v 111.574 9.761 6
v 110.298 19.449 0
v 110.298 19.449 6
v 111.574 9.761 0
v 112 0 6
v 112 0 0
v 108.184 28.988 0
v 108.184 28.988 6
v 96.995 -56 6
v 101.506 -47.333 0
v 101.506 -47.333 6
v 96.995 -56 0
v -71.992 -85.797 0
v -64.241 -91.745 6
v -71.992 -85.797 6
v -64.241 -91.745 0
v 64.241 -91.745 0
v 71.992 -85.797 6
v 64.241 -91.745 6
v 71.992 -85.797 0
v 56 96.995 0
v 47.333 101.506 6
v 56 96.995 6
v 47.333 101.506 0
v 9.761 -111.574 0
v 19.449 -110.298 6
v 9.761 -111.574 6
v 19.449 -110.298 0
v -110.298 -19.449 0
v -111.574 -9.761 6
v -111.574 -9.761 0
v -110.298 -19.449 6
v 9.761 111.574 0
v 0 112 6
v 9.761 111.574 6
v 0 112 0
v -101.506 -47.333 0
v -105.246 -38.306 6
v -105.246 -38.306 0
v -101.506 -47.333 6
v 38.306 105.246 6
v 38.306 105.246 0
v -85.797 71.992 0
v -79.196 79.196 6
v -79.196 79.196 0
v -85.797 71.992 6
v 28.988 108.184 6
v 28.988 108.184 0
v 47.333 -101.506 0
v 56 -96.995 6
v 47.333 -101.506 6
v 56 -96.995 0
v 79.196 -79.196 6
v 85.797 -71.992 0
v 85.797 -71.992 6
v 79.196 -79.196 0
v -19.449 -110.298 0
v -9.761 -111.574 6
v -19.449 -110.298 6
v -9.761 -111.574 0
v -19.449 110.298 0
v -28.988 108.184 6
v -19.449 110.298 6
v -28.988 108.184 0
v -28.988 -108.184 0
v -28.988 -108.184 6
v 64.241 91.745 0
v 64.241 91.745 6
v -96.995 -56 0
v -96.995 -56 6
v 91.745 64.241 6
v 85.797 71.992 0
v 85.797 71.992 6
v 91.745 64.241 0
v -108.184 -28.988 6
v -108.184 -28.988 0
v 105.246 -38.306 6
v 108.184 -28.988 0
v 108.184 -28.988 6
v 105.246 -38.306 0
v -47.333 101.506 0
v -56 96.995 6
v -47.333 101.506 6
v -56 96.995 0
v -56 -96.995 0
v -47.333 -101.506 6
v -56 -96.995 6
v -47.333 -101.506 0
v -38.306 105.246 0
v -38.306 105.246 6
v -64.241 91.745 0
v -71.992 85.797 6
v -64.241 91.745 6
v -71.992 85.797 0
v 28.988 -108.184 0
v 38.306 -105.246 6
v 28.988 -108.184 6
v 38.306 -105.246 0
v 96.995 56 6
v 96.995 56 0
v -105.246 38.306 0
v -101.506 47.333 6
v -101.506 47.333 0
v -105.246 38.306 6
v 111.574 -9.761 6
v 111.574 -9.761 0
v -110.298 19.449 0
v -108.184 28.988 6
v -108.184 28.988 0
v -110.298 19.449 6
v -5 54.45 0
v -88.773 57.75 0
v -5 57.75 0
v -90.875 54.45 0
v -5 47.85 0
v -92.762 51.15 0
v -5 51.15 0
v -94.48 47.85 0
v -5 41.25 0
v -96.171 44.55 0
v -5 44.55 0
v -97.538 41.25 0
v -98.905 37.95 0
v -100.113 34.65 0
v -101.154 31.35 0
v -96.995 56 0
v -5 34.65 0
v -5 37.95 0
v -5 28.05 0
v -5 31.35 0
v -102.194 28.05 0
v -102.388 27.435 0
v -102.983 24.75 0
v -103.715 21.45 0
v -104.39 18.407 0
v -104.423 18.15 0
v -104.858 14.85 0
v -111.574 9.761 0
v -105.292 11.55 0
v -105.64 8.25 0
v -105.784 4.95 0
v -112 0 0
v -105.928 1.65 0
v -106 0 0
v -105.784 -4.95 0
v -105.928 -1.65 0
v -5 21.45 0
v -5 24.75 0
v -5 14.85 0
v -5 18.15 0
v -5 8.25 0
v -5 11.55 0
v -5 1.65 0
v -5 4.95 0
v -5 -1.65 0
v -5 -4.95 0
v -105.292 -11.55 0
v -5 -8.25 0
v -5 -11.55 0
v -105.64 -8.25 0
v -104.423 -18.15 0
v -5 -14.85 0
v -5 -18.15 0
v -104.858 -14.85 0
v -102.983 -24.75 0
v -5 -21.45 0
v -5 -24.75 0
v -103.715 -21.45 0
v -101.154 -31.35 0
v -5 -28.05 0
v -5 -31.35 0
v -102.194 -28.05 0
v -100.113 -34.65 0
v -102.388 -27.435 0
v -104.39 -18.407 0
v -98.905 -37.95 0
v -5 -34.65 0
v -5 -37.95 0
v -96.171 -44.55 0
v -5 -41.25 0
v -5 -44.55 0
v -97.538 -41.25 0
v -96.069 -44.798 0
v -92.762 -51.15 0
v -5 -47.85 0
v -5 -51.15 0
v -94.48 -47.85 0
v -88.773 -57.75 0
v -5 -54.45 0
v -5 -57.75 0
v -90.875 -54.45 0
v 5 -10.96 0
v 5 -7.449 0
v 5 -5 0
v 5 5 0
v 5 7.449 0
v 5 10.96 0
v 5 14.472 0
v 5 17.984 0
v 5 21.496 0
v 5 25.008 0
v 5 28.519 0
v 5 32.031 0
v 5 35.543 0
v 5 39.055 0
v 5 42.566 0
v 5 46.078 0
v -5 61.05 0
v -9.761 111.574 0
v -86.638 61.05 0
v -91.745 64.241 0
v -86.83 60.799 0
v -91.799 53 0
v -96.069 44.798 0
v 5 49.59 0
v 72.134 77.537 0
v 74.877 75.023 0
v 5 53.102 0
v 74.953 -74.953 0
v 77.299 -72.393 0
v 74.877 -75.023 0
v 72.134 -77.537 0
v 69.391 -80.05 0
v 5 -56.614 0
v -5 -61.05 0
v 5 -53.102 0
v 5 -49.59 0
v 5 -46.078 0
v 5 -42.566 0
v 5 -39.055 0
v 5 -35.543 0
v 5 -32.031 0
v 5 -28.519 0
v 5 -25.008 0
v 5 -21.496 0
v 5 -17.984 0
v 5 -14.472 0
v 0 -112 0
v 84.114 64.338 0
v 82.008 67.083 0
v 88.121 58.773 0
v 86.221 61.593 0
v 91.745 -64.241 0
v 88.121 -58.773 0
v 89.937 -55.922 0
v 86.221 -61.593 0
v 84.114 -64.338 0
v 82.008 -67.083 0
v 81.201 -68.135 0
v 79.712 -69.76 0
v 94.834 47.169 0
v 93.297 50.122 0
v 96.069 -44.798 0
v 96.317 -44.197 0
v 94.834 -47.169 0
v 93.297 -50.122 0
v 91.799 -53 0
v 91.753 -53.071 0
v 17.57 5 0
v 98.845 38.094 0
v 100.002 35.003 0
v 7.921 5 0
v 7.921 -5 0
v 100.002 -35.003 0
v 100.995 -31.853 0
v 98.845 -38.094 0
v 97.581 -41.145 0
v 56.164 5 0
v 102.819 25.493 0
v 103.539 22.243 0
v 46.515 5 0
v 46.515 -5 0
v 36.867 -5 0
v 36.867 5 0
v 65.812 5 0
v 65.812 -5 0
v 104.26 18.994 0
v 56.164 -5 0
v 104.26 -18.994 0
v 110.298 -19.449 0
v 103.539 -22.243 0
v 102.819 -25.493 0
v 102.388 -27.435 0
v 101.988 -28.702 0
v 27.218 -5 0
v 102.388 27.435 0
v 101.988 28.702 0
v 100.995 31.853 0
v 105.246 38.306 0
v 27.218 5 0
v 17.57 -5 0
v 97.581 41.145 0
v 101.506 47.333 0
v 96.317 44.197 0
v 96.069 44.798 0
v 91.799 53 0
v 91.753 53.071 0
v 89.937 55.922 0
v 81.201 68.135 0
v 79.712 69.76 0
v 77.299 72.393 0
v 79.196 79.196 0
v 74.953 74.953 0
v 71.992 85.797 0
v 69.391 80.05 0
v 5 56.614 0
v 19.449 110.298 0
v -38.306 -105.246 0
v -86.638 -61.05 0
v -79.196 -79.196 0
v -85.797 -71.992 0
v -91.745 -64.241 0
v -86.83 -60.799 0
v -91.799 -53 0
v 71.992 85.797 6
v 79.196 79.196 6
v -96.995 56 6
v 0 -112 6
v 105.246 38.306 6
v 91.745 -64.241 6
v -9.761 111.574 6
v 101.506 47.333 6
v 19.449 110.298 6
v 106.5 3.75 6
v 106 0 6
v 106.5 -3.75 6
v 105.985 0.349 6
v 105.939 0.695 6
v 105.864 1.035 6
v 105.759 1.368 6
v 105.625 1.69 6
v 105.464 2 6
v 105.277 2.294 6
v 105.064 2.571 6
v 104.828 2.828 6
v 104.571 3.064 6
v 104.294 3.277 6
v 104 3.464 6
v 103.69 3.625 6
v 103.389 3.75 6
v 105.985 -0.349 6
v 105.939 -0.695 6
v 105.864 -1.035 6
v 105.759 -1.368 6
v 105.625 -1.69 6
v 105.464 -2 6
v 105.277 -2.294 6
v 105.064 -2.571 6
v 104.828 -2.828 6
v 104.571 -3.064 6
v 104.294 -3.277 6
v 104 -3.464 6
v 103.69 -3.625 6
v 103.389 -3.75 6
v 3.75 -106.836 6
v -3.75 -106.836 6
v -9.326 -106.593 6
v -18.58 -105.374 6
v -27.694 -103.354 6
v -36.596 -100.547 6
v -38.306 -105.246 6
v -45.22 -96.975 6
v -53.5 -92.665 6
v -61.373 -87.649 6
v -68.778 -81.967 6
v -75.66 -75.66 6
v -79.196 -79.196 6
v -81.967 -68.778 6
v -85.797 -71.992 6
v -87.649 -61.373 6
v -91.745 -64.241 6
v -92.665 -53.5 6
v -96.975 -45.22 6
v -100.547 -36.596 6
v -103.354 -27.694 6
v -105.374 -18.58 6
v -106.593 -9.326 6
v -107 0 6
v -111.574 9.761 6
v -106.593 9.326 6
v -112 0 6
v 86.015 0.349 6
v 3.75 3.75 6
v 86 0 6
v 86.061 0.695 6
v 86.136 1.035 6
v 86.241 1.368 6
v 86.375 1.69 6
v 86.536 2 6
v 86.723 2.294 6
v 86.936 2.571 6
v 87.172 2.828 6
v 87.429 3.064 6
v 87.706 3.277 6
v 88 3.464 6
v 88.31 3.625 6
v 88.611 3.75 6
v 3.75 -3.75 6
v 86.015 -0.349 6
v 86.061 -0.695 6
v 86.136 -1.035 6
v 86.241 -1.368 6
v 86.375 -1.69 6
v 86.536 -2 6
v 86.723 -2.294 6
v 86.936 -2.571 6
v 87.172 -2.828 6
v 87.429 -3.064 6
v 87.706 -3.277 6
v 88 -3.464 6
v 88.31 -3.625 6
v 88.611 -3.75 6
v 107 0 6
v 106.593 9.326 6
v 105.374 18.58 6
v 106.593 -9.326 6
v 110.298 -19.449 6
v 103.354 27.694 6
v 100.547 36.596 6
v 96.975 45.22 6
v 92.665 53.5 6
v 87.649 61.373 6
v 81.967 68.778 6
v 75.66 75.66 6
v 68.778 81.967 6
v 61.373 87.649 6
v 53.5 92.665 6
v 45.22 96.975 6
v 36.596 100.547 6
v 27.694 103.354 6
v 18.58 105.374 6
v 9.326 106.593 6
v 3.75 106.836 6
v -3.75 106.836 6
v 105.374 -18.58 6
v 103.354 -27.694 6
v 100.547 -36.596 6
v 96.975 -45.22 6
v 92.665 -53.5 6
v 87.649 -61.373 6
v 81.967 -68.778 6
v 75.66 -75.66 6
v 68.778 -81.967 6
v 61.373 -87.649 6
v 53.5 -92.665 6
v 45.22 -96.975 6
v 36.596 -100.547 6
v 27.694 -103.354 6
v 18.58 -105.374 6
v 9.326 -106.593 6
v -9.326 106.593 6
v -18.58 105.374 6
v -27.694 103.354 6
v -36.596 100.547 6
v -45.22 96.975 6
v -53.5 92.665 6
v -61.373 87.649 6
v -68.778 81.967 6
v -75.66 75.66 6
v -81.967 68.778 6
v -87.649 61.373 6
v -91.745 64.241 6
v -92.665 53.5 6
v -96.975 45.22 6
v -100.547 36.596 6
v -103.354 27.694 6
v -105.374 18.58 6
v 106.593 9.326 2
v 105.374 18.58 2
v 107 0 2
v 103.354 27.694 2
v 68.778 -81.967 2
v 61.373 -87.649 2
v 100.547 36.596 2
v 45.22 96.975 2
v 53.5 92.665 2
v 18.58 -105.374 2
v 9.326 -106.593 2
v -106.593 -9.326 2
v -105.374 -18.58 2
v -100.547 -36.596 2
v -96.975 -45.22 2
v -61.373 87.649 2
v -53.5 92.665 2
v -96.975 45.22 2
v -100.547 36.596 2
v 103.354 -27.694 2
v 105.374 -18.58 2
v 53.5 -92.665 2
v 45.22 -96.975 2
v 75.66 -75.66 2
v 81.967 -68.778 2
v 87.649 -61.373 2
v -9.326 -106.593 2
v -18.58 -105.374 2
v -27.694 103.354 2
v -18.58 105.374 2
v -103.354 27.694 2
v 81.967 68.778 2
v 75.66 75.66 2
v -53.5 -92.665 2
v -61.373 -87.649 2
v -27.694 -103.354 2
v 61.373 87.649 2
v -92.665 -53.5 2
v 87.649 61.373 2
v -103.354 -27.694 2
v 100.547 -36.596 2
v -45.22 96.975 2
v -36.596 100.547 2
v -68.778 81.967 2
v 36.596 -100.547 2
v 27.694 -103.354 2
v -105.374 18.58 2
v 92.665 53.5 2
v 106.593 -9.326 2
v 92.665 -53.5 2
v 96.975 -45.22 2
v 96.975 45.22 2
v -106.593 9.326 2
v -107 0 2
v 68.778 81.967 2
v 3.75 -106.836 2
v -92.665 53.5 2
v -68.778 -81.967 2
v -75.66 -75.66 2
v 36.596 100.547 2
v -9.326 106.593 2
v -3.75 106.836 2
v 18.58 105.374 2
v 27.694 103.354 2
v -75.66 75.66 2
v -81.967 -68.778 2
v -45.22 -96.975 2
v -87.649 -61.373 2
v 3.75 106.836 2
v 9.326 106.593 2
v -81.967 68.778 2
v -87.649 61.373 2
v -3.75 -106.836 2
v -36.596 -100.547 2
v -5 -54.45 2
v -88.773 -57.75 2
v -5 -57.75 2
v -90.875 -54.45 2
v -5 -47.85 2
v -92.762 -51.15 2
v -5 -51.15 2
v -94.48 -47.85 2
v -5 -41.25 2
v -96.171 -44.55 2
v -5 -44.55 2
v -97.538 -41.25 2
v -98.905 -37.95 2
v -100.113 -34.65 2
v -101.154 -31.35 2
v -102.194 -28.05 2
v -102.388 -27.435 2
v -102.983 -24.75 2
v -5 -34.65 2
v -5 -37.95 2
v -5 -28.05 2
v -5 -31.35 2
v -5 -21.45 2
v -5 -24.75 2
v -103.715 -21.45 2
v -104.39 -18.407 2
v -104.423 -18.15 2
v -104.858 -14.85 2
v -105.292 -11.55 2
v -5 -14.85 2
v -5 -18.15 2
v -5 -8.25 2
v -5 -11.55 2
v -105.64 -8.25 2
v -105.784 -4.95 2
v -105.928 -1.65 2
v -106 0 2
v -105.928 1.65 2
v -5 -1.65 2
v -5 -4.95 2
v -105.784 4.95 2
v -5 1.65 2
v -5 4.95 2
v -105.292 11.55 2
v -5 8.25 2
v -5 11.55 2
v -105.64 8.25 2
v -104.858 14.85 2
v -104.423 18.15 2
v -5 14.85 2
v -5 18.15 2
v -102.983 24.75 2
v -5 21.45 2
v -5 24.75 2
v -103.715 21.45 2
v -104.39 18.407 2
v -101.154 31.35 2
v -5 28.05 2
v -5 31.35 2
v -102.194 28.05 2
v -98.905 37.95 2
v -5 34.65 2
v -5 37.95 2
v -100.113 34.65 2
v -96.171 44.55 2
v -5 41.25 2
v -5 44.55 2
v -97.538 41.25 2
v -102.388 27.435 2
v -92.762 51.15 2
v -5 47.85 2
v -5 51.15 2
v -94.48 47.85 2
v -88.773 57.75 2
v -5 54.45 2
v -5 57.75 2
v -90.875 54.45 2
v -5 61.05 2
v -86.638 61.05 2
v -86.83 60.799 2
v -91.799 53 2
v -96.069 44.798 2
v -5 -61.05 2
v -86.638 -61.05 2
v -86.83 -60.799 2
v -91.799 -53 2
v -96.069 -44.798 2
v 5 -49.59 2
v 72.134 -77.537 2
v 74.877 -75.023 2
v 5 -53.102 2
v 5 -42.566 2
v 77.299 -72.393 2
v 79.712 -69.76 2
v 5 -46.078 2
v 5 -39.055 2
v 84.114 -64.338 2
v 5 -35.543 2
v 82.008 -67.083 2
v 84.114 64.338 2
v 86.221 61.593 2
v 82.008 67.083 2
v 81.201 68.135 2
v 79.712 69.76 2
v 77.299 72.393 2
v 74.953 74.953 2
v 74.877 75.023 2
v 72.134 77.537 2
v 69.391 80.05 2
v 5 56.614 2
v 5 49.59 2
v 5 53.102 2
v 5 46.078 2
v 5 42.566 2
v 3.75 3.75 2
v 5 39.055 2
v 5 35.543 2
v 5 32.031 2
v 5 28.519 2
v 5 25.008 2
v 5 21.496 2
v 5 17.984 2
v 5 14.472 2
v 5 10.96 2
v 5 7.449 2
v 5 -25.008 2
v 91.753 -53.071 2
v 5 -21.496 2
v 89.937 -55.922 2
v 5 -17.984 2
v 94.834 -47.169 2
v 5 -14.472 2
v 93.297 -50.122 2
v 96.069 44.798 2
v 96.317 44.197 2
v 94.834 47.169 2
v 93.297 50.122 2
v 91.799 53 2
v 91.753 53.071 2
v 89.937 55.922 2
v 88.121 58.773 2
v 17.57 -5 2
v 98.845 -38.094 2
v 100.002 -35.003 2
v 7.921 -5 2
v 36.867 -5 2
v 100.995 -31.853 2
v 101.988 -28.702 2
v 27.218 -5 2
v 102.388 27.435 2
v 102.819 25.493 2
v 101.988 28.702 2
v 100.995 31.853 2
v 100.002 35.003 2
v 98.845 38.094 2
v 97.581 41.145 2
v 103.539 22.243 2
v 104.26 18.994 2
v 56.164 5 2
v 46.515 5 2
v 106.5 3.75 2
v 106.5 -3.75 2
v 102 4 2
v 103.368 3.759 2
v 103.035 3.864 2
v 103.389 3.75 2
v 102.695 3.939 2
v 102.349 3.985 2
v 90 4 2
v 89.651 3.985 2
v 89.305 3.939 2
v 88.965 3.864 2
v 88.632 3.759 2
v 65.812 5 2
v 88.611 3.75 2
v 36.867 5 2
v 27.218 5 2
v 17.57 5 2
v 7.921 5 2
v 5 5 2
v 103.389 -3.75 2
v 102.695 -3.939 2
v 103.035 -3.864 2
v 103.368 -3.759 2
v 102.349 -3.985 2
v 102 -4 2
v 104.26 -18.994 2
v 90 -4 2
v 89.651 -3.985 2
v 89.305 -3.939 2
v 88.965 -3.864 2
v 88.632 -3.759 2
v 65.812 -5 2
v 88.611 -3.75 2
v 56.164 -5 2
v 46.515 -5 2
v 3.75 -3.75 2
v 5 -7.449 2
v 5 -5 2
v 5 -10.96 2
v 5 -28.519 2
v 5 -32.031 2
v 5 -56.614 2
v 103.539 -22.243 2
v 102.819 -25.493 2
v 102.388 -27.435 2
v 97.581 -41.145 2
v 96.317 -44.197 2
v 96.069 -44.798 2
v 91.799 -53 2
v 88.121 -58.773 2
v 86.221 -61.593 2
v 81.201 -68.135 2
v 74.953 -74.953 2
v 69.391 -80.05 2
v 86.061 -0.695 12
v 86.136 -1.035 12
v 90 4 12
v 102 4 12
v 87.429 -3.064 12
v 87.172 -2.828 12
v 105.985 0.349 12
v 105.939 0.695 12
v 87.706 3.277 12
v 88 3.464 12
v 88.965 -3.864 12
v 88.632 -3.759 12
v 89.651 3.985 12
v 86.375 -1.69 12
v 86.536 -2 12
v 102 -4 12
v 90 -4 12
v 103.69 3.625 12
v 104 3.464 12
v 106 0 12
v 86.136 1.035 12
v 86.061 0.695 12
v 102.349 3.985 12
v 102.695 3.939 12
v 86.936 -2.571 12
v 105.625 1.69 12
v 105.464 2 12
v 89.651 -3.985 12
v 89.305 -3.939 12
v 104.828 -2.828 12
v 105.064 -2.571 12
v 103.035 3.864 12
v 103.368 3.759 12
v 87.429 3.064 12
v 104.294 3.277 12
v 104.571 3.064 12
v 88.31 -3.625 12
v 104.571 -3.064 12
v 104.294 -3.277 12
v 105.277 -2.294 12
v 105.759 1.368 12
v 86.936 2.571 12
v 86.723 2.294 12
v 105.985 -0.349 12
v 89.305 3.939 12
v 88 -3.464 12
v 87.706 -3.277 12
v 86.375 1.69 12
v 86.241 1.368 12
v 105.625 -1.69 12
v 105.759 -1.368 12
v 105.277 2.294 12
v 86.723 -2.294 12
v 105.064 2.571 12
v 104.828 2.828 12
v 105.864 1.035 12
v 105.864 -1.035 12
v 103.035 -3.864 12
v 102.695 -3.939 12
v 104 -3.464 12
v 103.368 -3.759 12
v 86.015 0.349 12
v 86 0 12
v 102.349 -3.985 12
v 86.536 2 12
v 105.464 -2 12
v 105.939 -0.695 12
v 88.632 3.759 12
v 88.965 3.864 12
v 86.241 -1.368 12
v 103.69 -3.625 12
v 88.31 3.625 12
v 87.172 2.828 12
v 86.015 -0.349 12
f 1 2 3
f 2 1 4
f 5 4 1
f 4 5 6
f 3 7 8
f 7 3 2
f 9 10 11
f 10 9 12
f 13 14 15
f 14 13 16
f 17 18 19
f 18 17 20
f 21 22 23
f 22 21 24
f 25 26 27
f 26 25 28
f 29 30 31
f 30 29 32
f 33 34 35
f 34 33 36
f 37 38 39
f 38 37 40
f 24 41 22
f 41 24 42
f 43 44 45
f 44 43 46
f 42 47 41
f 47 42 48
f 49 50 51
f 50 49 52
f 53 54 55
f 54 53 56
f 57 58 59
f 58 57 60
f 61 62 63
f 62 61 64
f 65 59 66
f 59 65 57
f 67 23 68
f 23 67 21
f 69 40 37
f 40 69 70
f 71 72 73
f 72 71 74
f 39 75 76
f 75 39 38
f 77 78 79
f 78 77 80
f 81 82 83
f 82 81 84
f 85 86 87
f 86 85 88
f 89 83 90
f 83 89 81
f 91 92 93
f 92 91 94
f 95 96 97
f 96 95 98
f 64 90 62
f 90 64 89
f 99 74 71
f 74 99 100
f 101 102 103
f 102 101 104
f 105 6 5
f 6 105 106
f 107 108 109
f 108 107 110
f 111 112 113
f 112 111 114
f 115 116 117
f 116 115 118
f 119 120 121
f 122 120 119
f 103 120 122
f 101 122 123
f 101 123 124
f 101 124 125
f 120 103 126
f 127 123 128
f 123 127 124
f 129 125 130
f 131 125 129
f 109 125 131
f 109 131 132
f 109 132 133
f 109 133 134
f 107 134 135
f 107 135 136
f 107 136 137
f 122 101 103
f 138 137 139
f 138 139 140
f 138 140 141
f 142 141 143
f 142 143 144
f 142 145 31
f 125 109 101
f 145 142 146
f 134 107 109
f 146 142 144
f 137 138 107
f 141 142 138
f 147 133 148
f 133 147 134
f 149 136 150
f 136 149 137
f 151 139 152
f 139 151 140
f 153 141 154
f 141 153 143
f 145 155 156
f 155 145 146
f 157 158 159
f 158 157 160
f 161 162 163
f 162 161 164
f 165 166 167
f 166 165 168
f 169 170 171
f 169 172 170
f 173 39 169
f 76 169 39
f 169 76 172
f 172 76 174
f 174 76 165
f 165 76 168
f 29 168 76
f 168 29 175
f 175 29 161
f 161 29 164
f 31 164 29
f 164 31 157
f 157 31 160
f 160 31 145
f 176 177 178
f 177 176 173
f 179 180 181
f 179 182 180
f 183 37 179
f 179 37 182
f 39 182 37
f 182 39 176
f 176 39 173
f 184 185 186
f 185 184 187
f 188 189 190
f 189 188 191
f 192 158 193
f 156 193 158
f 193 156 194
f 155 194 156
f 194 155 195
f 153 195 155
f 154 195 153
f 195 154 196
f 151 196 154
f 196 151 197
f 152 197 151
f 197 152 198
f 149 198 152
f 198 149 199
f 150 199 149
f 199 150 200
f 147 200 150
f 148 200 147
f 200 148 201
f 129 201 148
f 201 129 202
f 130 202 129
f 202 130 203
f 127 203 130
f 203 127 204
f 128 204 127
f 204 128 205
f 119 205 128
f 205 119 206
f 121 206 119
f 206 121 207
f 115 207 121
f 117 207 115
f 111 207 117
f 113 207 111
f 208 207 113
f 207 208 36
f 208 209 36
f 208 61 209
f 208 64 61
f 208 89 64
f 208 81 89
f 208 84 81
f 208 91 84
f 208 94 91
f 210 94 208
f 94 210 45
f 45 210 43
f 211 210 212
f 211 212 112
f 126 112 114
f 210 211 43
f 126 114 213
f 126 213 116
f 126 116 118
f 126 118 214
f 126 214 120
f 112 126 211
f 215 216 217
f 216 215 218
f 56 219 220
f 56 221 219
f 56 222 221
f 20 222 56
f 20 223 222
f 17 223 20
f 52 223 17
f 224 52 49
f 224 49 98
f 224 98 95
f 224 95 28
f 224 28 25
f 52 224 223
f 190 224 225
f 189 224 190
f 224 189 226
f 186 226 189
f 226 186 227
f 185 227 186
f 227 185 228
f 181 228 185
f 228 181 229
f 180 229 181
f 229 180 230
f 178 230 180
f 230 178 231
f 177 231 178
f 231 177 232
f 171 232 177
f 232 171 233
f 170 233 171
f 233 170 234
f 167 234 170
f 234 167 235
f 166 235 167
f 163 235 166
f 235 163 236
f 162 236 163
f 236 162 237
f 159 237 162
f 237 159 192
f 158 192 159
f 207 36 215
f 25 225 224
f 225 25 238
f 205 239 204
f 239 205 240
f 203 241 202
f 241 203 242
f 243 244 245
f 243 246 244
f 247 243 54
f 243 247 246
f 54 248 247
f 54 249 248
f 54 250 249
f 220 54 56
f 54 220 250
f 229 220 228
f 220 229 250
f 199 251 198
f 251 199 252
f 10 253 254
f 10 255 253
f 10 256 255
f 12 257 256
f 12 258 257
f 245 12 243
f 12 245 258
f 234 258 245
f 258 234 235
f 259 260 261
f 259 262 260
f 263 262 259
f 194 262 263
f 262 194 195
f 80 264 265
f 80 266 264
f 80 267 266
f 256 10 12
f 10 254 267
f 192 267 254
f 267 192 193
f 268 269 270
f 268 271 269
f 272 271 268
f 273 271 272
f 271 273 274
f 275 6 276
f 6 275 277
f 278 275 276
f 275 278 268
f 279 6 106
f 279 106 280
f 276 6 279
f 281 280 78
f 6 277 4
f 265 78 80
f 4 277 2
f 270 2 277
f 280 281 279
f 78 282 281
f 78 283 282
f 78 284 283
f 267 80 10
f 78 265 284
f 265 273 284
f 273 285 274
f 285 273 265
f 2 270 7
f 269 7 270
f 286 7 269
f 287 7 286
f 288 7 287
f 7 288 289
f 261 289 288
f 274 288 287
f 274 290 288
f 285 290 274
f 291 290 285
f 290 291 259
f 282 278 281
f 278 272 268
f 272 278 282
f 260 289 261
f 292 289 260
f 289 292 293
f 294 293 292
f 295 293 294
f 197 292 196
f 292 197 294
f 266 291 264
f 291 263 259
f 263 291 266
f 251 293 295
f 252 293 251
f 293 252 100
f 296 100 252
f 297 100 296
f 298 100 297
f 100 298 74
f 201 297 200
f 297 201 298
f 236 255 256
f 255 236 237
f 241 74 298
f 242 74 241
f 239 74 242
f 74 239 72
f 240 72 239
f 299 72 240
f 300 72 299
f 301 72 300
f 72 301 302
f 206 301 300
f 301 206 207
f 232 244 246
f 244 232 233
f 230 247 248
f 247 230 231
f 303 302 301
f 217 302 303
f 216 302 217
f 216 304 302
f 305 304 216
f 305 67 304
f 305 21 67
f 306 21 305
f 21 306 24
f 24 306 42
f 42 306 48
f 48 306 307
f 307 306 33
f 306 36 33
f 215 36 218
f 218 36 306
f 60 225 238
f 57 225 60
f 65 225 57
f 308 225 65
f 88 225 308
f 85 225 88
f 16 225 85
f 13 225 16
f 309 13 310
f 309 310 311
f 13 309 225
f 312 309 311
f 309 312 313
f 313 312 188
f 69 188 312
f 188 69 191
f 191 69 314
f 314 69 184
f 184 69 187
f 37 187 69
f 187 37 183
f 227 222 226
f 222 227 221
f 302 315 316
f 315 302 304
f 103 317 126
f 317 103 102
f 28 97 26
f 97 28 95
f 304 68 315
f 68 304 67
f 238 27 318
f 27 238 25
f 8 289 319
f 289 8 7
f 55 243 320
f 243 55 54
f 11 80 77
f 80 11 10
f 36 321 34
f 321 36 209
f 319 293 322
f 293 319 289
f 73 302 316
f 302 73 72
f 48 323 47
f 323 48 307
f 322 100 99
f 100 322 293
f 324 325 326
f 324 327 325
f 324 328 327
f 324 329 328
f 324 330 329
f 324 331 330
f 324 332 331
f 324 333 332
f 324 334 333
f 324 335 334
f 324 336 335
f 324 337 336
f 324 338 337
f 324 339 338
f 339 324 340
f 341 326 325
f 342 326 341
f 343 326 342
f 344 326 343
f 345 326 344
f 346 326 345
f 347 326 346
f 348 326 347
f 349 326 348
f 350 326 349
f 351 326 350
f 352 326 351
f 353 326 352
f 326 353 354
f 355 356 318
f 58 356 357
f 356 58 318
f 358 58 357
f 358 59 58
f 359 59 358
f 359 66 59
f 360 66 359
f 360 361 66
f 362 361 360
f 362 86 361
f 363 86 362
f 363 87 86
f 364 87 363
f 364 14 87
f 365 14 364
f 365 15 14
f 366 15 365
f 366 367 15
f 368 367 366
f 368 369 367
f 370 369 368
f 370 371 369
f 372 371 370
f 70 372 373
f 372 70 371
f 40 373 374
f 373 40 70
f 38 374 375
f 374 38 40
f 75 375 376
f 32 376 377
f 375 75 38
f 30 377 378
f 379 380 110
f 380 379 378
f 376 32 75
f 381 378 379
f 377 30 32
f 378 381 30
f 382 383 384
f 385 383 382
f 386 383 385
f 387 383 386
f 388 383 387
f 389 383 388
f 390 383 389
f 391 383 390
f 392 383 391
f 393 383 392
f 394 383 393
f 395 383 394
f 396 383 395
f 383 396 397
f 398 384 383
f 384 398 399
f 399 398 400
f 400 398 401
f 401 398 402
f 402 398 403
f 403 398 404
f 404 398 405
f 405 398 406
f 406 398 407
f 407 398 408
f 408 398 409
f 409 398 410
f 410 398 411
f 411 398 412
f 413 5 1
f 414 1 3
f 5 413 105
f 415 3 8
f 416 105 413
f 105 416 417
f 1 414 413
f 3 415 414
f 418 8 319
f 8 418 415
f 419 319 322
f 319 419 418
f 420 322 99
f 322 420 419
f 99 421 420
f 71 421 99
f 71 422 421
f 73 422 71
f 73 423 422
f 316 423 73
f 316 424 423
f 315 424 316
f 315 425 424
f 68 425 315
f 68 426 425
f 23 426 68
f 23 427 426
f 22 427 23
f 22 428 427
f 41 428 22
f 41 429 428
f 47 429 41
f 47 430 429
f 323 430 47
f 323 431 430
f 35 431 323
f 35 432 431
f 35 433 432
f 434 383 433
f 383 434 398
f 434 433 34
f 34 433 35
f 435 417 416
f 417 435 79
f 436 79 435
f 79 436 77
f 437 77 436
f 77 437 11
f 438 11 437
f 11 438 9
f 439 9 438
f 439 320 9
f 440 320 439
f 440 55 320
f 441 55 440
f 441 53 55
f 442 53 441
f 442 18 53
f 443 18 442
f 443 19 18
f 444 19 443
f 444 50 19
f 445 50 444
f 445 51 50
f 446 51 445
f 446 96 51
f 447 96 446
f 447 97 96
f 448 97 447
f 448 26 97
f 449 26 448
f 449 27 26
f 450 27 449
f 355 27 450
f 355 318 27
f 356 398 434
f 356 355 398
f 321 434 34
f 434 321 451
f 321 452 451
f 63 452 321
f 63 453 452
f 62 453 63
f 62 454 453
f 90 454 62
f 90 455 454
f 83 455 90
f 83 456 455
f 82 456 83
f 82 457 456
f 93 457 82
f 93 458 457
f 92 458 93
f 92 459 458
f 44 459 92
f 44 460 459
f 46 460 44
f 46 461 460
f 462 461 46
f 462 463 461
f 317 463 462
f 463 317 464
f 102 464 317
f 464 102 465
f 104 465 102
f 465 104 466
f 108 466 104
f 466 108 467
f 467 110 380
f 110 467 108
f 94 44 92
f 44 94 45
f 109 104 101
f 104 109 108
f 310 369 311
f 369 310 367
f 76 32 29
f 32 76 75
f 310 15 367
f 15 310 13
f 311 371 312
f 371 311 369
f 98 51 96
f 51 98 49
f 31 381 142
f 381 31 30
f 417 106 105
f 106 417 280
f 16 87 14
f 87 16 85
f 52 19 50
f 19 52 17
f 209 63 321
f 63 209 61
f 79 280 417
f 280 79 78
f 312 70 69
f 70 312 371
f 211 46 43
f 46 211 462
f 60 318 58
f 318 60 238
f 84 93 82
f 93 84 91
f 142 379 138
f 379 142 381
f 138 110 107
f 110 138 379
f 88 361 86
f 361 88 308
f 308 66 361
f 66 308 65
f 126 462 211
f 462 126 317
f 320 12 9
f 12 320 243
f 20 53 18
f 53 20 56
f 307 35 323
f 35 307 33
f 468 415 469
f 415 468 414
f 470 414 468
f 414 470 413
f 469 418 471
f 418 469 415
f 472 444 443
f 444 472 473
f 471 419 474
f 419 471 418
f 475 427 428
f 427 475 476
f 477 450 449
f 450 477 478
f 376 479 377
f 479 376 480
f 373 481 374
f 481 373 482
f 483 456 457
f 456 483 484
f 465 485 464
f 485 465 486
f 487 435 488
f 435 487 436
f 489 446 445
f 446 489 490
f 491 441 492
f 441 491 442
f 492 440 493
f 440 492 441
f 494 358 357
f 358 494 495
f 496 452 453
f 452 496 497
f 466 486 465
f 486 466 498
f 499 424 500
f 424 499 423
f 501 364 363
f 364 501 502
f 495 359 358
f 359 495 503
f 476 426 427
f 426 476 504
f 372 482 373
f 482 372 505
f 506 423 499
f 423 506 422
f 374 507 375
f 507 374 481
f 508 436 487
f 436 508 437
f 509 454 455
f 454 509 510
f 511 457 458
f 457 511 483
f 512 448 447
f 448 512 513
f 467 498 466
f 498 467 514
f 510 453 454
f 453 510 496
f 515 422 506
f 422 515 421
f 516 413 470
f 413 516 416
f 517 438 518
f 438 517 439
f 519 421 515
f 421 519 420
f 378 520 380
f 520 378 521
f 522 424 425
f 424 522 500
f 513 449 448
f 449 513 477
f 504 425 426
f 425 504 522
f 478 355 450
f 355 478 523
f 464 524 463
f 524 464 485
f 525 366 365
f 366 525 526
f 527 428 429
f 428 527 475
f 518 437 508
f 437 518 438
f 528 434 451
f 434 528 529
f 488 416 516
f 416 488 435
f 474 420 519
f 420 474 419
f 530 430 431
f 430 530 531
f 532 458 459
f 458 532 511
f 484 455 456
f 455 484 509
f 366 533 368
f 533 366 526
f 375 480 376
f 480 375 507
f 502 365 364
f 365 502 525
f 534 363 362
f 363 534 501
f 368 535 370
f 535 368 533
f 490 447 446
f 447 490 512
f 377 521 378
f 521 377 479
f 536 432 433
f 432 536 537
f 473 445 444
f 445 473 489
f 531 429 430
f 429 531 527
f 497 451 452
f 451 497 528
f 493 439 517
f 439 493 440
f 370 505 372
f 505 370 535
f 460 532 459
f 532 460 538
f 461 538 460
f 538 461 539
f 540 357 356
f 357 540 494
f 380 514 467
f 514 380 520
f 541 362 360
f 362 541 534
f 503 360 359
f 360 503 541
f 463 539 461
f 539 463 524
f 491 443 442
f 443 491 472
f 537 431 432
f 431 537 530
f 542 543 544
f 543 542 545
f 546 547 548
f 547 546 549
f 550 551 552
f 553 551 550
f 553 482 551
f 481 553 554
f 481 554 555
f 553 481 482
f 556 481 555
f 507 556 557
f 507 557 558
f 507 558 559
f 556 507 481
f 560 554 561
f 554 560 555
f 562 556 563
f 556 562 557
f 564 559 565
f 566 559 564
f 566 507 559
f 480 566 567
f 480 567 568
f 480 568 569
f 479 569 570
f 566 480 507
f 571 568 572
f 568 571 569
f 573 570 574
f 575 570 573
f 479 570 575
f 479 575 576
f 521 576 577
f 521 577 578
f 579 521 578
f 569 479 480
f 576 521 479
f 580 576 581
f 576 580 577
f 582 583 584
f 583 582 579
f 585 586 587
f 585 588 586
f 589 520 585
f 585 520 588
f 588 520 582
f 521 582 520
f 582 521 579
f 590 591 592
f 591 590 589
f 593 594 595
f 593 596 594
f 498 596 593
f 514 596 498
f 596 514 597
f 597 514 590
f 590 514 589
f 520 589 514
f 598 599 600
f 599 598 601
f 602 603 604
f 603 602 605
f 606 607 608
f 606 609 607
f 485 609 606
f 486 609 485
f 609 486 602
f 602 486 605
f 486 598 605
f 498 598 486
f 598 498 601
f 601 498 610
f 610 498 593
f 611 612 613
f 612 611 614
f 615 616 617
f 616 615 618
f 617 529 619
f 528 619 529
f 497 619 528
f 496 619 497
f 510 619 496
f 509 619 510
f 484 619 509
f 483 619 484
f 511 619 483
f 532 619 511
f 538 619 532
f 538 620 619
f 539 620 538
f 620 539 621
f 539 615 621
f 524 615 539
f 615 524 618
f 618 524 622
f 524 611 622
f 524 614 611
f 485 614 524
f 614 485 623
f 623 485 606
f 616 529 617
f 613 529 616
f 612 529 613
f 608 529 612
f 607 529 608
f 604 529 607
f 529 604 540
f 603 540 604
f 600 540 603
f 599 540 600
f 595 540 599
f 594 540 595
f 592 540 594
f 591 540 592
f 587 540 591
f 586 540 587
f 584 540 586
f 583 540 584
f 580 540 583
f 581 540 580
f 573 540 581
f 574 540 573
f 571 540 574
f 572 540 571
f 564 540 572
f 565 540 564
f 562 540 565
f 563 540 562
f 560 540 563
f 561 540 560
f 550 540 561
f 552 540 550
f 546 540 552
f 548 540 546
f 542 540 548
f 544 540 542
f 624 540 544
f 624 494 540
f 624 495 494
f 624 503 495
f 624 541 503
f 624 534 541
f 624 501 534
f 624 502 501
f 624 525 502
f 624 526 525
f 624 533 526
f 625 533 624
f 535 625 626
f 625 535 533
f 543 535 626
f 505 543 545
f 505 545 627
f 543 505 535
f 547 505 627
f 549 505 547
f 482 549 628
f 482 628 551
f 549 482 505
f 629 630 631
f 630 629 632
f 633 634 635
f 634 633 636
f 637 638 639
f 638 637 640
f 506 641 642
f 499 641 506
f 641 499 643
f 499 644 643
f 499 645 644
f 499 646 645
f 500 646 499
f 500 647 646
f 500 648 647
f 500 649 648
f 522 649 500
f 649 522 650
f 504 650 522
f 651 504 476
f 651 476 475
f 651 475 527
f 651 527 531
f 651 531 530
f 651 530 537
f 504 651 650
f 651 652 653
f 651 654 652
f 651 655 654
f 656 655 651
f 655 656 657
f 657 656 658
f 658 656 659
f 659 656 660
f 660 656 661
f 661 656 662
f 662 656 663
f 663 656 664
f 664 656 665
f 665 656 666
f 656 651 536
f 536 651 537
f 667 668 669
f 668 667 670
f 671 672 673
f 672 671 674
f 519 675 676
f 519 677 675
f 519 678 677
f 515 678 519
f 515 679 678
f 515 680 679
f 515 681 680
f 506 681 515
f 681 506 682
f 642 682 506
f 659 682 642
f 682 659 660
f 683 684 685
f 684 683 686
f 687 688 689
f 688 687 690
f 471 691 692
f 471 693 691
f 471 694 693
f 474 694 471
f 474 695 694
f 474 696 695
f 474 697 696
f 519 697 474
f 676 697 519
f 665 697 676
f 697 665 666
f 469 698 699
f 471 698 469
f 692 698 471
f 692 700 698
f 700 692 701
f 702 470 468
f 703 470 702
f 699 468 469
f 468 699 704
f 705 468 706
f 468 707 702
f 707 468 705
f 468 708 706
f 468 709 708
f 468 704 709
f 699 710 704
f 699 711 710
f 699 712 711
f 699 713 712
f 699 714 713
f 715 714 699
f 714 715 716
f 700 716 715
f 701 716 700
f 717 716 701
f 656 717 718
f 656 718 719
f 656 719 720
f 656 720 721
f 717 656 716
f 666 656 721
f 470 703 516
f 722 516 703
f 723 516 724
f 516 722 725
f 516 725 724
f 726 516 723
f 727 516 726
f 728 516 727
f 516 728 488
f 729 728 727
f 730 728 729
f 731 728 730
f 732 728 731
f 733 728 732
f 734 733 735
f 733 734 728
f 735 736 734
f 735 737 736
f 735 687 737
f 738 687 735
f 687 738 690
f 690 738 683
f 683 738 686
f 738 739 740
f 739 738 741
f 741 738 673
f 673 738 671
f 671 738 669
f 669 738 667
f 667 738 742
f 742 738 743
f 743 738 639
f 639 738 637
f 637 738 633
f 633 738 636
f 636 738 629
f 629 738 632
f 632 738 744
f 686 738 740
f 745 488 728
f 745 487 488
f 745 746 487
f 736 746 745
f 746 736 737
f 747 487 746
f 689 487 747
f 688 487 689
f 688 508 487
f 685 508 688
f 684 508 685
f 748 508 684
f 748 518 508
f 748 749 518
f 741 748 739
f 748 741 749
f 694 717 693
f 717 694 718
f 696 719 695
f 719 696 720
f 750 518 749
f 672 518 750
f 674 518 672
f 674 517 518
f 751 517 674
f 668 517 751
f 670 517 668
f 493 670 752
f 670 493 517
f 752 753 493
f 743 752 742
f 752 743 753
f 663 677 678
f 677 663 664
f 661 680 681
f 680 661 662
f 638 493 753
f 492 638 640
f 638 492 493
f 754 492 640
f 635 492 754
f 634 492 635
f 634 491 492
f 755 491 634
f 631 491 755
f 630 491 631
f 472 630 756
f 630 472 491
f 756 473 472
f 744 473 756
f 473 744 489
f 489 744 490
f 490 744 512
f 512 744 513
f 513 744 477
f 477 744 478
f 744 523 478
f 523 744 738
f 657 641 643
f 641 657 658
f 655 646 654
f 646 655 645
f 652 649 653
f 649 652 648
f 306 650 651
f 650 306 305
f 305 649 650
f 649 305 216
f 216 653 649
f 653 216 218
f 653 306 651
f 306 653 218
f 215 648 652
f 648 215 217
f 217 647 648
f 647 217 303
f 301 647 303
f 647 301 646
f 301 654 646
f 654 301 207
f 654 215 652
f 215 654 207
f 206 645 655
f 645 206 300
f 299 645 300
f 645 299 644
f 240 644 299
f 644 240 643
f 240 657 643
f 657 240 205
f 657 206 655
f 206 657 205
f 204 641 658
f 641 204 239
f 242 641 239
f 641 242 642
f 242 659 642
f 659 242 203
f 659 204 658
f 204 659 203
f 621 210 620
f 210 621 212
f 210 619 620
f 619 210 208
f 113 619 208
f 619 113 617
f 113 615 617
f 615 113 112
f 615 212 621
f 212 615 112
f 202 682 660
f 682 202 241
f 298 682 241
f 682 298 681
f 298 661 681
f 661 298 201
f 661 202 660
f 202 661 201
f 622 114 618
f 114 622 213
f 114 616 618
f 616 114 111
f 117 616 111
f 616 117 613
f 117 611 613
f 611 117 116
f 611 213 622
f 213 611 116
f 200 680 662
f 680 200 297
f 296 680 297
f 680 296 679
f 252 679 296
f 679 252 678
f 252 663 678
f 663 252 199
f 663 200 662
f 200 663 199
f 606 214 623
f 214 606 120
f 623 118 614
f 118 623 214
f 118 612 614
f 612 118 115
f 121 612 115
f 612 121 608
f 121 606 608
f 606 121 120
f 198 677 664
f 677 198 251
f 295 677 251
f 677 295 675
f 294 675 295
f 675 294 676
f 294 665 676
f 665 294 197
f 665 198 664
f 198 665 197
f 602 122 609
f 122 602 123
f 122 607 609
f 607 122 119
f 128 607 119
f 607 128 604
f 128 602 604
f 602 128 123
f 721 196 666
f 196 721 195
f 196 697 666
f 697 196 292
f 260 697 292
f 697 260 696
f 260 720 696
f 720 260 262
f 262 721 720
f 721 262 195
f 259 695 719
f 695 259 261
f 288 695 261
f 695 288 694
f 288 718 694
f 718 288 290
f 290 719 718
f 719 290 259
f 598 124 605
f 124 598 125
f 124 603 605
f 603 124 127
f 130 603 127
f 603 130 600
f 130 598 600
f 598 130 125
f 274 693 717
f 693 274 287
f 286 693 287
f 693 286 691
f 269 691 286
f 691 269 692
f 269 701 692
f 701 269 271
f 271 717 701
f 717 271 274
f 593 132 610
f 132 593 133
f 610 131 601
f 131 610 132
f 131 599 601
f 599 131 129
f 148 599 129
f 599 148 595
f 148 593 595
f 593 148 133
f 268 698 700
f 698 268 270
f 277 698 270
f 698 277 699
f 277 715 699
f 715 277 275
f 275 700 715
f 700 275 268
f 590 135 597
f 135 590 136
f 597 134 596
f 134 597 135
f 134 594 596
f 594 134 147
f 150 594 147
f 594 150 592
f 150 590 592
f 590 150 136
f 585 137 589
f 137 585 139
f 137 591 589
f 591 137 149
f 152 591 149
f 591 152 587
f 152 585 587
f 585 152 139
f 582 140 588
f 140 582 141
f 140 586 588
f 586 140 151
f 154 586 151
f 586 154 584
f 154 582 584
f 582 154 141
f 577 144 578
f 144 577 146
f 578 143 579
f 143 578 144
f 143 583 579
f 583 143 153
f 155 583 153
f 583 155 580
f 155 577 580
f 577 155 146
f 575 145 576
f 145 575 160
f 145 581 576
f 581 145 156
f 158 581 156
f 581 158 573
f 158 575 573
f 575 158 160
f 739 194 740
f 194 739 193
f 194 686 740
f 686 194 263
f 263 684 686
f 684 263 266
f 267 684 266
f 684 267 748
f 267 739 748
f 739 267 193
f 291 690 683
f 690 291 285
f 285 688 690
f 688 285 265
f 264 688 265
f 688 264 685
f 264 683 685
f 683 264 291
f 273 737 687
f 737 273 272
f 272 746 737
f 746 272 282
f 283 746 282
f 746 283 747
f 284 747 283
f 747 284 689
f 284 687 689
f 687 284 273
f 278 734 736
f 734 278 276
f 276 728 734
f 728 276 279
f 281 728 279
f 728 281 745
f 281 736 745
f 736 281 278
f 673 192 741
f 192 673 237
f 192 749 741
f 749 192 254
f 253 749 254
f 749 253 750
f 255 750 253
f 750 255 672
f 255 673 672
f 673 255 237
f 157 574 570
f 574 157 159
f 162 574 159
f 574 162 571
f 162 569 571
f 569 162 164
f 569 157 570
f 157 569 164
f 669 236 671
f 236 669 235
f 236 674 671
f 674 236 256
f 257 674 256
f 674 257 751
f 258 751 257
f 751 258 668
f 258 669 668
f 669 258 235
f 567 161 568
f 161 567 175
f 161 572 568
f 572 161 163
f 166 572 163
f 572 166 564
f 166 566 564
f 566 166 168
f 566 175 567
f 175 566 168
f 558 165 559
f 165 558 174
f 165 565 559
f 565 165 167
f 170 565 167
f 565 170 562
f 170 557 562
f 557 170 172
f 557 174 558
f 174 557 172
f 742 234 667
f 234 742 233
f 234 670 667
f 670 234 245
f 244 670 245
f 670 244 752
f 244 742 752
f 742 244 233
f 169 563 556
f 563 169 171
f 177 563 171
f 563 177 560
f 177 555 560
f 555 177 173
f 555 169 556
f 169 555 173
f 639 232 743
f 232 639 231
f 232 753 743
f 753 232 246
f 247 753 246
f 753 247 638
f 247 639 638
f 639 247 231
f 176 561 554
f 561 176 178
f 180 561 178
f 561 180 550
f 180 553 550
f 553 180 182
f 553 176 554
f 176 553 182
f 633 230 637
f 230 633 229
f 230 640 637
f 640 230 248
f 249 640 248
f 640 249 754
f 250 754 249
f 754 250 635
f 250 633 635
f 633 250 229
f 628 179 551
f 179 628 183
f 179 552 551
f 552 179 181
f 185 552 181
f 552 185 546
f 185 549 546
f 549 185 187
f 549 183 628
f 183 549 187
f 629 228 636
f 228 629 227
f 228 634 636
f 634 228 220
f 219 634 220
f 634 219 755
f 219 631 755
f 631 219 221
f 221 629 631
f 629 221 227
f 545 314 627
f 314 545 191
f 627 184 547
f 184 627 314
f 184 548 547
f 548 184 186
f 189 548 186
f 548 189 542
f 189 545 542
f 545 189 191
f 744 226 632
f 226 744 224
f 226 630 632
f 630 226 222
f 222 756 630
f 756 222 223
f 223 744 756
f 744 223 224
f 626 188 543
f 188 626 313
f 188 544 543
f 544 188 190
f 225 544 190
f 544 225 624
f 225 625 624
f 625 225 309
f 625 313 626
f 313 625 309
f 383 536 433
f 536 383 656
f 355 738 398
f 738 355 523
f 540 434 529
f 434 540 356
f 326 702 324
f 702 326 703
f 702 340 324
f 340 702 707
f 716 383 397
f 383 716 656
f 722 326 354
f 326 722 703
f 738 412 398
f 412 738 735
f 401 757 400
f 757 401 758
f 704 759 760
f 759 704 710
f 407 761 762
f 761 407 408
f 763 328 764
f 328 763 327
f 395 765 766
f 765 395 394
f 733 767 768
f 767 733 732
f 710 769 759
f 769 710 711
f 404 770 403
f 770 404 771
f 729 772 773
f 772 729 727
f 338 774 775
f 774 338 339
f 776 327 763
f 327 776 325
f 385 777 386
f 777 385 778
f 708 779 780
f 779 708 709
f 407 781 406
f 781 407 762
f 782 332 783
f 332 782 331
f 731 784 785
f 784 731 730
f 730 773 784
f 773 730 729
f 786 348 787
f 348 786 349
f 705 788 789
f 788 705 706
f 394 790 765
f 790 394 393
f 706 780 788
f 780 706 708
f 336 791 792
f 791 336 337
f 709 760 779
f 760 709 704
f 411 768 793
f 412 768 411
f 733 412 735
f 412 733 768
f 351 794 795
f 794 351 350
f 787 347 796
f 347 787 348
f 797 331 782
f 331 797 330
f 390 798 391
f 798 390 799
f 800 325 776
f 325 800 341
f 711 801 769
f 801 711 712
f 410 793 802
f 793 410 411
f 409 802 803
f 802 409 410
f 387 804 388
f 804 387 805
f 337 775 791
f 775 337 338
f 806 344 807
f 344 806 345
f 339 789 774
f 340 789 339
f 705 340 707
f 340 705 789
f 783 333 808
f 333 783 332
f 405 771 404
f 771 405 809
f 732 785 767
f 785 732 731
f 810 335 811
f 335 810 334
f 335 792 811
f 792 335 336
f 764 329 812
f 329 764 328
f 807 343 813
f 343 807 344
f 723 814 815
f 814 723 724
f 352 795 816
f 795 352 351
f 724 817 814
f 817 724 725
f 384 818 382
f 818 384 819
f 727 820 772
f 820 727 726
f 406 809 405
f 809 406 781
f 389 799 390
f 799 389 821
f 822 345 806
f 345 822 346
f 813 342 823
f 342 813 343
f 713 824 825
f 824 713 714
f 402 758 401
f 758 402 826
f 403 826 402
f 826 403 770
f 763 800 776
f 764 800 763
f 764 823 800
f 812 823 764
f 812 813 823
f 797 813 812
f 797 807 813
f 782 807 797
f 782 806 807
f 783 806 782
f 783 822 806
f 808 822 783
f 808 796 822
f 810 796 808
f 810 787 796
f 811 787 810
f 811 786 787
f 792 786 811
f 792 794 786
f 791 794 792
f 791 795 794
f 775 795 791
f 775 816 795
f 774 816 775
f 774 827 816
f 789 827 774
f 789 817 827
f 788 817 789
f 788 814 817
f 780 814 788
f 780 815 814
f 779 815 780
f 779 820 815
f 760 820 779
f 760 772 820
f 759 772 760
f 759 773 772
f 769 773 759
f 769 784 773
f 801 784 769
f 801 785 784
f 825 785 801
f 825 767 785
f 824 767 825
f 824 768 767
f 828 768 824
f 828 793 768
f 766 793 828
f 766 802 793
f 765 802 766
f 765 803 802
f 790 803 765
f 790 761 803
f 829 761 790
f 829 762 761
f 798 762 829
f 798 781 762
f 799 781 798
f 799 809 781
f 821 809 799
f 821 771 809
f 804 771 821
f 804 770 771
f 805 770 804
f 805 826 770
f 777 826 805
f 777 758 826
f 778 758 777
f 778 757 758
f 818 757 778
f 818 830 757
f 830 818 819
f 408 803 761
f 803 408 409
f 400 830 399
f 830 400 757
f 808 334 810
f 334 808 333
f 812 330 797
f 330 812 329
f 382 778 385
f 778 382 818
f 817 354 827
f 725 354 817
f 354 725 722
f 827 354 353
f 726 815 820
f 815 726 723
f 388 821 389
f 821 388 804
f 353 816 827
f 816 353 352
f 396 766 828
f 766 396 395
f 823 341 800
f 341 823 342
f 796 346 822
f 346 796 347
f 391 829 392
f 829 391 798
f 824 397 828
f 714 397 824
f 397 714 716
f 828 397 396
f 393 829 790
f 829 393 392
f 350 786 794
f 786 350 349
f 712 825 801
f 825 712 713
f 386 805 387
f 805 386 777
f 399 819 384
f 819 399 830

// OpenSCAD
/*                                                 -*- c++ -*-
 * A Bahtinov mask generator.
 * Units in mm, default values are for
 * an 8 inch Newtonian
 *
 * Copyright 2013-2014, Brent Burton
 * License: CC-BY-SA
 *
 * Based on version updated: 2014-06-23
 *
 * Further modifications by Egil Kvaleberg
 * Latest update: 2014-01-26
 */

// Number of sections to split the mask in
sections = 0; // [1,2,4]

// Print which section, max is sections-1
section = 0; // [0,1,2,3]

// The overall diameter of the mask.
outerDiameter = 224.0; //

// The telescope light path diameter.
aperture = 212.0; // should be less than outerDiameter

// Diameter of secondary mirror holder. If no secondary, set to 0.
centerHoleDiameter = 0; // 

// Width of the bars.
gap = 3.3; // 3.3 is for 1000mm focal length; 4.0 for 1200mm; 6.0 for 2000mm

// Angle of bars
angle = 20; // 20 degrees is the standard value

// Maximum number of bars
maxBars = 10; // 

// Width of the strengthening bars.
bar = 10.0; 

// Height of gap mask
mHeight = 2.0;  // 

// Height of strengthening bars
bHeight = 6.0; // 

// Extra air needed between sections (times two) 
tol = 0.25; // Depends on the accuracy of your printer

d = 1 * 0.01;

/* create a series of bars covering roughly one half of the
 * scope aperture. Located in the +X side.
 */
module bars(gap, width, num=5) {
    num = round(num);
    for (i=[-num:num]) {
        translate([width/2,i*2*gap]) square([width,gap], center=true);
    }
}

module bahtinovBars(gap,width) {
    numBars = min(maxBars-1, aperture/2 / gap / 2 -1);
    // +X +Y bars
    intersection() {
        translate([0, outerDiameter*.08, 0]) rotate([0,0,angle]) bars(gap, width, numBars/2);
        square([outerDiameter/2, outerDiameter/2], center=false);
    }
    // +X -Y bars
    intersection() {
        translate([0, -outerDiameter*.08, 0]) rotate([0,0,-angle]) bars(gap, width, numBars/2);
        translate([0,-outerDiameter/2]) square([outerDiameter/2, outerDiameter/2], center=false);
    }
    // -X bars 
    rotate([0,0,180]) {
		if (sections<=2) bars(gap, width, numBars);
		else translate([0,gap,0]) bars(gap, width, numBars+1); 	 // offset so there is a solid bar in the middle
	}
}

$fn=72;
module bahtinov2D() {
    width = aperture/2;

    union() {
        difference() {                  // trims the mask to aperture size
            circle(r=aperture/2+1);
            bahtinovBars(gap,width);
        }
        difference() {                  // makes the outer margin
            circle(r=outerDiameter/2-1);
            circle(r=aperture/2);
        }
        // Add horizontal and vertical structural bars:
		  square([bar,2*(aperture/2+1)], center=true);

        if (sections==4) square([2*(aperture/2+1),bar], center=true);
		  else translate([aperture/4,0]) square([aperture/2+1,bar], center=true);
        // Add center hole margin if needed:
        if (centerHoleDiameter > 0 && centerHoleDiameter < outerDiameter) {
            circle(r=(centerHoleDiameter)/2+gap);
        }
    }
}

module bahtinov() {
   difference() {                          // overall plate minus center hole	
		union() {
	   		linear_extrude(height=mHeight) bahtinov2D();
			// Add strengthening bars
	       difference() {
	          cylinder(r=outerDiameter/2, h=bHeight);
	          translate([0,0,-d]) cylinder(r=aperture/2+1, h=bHeight+2*d);
	       }
	       // Add horizontal and vertical structural bars:
	       translate([0,0,bHeight/2]) 
				cube([bar*.75,2*(aperture/2+1),bHeight], center=true);
	       if (sections==4) translate([0,0,bHeight/2]) 
				cube([2*(aperture/2+1),bar*.75,bHeight], center=true);
			else translate([aperture/4,0,bHeight/2]) 
				cube([aperture/2+1,bar*.75,bHeight], center=true);
	
	  		// Add a little handle
	    	translate([outerDiameter/2-bar,0,0]) hull () {
				cylinder(r=bar*.4, h=12);
				translate([-12,0,0]) cylinder(r=bar*.4, h=12);
			}
		}
      // subtract center hole if needed
      if (centerHoleDiameter > 0 && centerHoleDiameter < outerDiameter) {
          translate([0,0,-0.1]) cylinder(r=centerHoleDiameter/2+1, h=bHeight+0.2);
      }
   }
}

// create the outline that defines the cut between sections 
module section() {
 	// the factor 20 can be tuned
	step = (outerDiameter-centerHoleDiameter-bar)/20;

	if (sections==2) translate([bar/4+tol, -outerDiameter/2, 0])
		cube([outerDiameter/2, outerDiameter, mHeight+12]);
	else translate([bar/4+tol, bar/4+tol, 0])
		cube([outerDiameter/2, outerDiameter/2, mHeight+12]);
	rotate ([0,0,(sections==2)?-90:0]) {
		for (x=[centerHoleDiameter/2+bar/2:2*step:outerDiameter/2-step]) {
			translate([x,-bar/8,0]) 
				hull () {
					cylinder(r=bar/8-tol, h=mHeight+12);
					translate([step,0,0]) cylinder(r=bar/8-tol, h=mHeight+12);
				}
			difference () {
				translate([x,-tol,0]) cube([step, bar/4+2*tol, mHeight+12]);
				translate([x,bar/8,-d]) { 
					cylinder(r=bar/8+tol, h=mHeight+12+2*d);
	 				translate([step,0,0]) cylinder(r=bar/8+tol, h=mHeight+12+2*d);
				}
			}
		}
		// filler at start
		translate([centerHoleDiameter/2+tol+((centerHoleDiameter>0 || sections==2 || section==0 || section==2)? 0: bar/4),-bar/4+tol,0]) cube([step, bar/2, mHeight+12]);
	}

	for (y=[centerHoleDiameter/2+bar/2+step:2*step:outerDiameter/2-step]) {
		translate([-bar/8,y,0]) 
			hull () {
				cylinder(r=bar/8-tol, h=mHeight+12);
				translate([0,step,0]) cylinder(r=bar/8-tol, h=mHeight+12);
			}
		difference () {
			translate([-tol,y,0]) cube([bar/4+2*tol, step, mHeight+12]);
			translate([bar/8,y,-d]) { 
				cylinder(r=bar/8+tol, h=mHeight+12+2*d);
 				translate([0,step,0]) cylinder(r=bar/8+tol, h=mHeight+12+2*d);
			}
		}
	}
	// filler at end
	translate([-bar/4+tol,outerDiameter/2-bar/2,0]) cube([bar/2, step, mHeight+12]);
}
	
px = (360 / sections) * section;
qx = (sections == 2) ? 90 + 45 : 0;

if (sections > 1) {
	rotate([0, 0, qx]) intersection () {
		bahtinov();	
		rotate([0, 0, px]) section();
	}
} else {
	bahtinov();	
}
